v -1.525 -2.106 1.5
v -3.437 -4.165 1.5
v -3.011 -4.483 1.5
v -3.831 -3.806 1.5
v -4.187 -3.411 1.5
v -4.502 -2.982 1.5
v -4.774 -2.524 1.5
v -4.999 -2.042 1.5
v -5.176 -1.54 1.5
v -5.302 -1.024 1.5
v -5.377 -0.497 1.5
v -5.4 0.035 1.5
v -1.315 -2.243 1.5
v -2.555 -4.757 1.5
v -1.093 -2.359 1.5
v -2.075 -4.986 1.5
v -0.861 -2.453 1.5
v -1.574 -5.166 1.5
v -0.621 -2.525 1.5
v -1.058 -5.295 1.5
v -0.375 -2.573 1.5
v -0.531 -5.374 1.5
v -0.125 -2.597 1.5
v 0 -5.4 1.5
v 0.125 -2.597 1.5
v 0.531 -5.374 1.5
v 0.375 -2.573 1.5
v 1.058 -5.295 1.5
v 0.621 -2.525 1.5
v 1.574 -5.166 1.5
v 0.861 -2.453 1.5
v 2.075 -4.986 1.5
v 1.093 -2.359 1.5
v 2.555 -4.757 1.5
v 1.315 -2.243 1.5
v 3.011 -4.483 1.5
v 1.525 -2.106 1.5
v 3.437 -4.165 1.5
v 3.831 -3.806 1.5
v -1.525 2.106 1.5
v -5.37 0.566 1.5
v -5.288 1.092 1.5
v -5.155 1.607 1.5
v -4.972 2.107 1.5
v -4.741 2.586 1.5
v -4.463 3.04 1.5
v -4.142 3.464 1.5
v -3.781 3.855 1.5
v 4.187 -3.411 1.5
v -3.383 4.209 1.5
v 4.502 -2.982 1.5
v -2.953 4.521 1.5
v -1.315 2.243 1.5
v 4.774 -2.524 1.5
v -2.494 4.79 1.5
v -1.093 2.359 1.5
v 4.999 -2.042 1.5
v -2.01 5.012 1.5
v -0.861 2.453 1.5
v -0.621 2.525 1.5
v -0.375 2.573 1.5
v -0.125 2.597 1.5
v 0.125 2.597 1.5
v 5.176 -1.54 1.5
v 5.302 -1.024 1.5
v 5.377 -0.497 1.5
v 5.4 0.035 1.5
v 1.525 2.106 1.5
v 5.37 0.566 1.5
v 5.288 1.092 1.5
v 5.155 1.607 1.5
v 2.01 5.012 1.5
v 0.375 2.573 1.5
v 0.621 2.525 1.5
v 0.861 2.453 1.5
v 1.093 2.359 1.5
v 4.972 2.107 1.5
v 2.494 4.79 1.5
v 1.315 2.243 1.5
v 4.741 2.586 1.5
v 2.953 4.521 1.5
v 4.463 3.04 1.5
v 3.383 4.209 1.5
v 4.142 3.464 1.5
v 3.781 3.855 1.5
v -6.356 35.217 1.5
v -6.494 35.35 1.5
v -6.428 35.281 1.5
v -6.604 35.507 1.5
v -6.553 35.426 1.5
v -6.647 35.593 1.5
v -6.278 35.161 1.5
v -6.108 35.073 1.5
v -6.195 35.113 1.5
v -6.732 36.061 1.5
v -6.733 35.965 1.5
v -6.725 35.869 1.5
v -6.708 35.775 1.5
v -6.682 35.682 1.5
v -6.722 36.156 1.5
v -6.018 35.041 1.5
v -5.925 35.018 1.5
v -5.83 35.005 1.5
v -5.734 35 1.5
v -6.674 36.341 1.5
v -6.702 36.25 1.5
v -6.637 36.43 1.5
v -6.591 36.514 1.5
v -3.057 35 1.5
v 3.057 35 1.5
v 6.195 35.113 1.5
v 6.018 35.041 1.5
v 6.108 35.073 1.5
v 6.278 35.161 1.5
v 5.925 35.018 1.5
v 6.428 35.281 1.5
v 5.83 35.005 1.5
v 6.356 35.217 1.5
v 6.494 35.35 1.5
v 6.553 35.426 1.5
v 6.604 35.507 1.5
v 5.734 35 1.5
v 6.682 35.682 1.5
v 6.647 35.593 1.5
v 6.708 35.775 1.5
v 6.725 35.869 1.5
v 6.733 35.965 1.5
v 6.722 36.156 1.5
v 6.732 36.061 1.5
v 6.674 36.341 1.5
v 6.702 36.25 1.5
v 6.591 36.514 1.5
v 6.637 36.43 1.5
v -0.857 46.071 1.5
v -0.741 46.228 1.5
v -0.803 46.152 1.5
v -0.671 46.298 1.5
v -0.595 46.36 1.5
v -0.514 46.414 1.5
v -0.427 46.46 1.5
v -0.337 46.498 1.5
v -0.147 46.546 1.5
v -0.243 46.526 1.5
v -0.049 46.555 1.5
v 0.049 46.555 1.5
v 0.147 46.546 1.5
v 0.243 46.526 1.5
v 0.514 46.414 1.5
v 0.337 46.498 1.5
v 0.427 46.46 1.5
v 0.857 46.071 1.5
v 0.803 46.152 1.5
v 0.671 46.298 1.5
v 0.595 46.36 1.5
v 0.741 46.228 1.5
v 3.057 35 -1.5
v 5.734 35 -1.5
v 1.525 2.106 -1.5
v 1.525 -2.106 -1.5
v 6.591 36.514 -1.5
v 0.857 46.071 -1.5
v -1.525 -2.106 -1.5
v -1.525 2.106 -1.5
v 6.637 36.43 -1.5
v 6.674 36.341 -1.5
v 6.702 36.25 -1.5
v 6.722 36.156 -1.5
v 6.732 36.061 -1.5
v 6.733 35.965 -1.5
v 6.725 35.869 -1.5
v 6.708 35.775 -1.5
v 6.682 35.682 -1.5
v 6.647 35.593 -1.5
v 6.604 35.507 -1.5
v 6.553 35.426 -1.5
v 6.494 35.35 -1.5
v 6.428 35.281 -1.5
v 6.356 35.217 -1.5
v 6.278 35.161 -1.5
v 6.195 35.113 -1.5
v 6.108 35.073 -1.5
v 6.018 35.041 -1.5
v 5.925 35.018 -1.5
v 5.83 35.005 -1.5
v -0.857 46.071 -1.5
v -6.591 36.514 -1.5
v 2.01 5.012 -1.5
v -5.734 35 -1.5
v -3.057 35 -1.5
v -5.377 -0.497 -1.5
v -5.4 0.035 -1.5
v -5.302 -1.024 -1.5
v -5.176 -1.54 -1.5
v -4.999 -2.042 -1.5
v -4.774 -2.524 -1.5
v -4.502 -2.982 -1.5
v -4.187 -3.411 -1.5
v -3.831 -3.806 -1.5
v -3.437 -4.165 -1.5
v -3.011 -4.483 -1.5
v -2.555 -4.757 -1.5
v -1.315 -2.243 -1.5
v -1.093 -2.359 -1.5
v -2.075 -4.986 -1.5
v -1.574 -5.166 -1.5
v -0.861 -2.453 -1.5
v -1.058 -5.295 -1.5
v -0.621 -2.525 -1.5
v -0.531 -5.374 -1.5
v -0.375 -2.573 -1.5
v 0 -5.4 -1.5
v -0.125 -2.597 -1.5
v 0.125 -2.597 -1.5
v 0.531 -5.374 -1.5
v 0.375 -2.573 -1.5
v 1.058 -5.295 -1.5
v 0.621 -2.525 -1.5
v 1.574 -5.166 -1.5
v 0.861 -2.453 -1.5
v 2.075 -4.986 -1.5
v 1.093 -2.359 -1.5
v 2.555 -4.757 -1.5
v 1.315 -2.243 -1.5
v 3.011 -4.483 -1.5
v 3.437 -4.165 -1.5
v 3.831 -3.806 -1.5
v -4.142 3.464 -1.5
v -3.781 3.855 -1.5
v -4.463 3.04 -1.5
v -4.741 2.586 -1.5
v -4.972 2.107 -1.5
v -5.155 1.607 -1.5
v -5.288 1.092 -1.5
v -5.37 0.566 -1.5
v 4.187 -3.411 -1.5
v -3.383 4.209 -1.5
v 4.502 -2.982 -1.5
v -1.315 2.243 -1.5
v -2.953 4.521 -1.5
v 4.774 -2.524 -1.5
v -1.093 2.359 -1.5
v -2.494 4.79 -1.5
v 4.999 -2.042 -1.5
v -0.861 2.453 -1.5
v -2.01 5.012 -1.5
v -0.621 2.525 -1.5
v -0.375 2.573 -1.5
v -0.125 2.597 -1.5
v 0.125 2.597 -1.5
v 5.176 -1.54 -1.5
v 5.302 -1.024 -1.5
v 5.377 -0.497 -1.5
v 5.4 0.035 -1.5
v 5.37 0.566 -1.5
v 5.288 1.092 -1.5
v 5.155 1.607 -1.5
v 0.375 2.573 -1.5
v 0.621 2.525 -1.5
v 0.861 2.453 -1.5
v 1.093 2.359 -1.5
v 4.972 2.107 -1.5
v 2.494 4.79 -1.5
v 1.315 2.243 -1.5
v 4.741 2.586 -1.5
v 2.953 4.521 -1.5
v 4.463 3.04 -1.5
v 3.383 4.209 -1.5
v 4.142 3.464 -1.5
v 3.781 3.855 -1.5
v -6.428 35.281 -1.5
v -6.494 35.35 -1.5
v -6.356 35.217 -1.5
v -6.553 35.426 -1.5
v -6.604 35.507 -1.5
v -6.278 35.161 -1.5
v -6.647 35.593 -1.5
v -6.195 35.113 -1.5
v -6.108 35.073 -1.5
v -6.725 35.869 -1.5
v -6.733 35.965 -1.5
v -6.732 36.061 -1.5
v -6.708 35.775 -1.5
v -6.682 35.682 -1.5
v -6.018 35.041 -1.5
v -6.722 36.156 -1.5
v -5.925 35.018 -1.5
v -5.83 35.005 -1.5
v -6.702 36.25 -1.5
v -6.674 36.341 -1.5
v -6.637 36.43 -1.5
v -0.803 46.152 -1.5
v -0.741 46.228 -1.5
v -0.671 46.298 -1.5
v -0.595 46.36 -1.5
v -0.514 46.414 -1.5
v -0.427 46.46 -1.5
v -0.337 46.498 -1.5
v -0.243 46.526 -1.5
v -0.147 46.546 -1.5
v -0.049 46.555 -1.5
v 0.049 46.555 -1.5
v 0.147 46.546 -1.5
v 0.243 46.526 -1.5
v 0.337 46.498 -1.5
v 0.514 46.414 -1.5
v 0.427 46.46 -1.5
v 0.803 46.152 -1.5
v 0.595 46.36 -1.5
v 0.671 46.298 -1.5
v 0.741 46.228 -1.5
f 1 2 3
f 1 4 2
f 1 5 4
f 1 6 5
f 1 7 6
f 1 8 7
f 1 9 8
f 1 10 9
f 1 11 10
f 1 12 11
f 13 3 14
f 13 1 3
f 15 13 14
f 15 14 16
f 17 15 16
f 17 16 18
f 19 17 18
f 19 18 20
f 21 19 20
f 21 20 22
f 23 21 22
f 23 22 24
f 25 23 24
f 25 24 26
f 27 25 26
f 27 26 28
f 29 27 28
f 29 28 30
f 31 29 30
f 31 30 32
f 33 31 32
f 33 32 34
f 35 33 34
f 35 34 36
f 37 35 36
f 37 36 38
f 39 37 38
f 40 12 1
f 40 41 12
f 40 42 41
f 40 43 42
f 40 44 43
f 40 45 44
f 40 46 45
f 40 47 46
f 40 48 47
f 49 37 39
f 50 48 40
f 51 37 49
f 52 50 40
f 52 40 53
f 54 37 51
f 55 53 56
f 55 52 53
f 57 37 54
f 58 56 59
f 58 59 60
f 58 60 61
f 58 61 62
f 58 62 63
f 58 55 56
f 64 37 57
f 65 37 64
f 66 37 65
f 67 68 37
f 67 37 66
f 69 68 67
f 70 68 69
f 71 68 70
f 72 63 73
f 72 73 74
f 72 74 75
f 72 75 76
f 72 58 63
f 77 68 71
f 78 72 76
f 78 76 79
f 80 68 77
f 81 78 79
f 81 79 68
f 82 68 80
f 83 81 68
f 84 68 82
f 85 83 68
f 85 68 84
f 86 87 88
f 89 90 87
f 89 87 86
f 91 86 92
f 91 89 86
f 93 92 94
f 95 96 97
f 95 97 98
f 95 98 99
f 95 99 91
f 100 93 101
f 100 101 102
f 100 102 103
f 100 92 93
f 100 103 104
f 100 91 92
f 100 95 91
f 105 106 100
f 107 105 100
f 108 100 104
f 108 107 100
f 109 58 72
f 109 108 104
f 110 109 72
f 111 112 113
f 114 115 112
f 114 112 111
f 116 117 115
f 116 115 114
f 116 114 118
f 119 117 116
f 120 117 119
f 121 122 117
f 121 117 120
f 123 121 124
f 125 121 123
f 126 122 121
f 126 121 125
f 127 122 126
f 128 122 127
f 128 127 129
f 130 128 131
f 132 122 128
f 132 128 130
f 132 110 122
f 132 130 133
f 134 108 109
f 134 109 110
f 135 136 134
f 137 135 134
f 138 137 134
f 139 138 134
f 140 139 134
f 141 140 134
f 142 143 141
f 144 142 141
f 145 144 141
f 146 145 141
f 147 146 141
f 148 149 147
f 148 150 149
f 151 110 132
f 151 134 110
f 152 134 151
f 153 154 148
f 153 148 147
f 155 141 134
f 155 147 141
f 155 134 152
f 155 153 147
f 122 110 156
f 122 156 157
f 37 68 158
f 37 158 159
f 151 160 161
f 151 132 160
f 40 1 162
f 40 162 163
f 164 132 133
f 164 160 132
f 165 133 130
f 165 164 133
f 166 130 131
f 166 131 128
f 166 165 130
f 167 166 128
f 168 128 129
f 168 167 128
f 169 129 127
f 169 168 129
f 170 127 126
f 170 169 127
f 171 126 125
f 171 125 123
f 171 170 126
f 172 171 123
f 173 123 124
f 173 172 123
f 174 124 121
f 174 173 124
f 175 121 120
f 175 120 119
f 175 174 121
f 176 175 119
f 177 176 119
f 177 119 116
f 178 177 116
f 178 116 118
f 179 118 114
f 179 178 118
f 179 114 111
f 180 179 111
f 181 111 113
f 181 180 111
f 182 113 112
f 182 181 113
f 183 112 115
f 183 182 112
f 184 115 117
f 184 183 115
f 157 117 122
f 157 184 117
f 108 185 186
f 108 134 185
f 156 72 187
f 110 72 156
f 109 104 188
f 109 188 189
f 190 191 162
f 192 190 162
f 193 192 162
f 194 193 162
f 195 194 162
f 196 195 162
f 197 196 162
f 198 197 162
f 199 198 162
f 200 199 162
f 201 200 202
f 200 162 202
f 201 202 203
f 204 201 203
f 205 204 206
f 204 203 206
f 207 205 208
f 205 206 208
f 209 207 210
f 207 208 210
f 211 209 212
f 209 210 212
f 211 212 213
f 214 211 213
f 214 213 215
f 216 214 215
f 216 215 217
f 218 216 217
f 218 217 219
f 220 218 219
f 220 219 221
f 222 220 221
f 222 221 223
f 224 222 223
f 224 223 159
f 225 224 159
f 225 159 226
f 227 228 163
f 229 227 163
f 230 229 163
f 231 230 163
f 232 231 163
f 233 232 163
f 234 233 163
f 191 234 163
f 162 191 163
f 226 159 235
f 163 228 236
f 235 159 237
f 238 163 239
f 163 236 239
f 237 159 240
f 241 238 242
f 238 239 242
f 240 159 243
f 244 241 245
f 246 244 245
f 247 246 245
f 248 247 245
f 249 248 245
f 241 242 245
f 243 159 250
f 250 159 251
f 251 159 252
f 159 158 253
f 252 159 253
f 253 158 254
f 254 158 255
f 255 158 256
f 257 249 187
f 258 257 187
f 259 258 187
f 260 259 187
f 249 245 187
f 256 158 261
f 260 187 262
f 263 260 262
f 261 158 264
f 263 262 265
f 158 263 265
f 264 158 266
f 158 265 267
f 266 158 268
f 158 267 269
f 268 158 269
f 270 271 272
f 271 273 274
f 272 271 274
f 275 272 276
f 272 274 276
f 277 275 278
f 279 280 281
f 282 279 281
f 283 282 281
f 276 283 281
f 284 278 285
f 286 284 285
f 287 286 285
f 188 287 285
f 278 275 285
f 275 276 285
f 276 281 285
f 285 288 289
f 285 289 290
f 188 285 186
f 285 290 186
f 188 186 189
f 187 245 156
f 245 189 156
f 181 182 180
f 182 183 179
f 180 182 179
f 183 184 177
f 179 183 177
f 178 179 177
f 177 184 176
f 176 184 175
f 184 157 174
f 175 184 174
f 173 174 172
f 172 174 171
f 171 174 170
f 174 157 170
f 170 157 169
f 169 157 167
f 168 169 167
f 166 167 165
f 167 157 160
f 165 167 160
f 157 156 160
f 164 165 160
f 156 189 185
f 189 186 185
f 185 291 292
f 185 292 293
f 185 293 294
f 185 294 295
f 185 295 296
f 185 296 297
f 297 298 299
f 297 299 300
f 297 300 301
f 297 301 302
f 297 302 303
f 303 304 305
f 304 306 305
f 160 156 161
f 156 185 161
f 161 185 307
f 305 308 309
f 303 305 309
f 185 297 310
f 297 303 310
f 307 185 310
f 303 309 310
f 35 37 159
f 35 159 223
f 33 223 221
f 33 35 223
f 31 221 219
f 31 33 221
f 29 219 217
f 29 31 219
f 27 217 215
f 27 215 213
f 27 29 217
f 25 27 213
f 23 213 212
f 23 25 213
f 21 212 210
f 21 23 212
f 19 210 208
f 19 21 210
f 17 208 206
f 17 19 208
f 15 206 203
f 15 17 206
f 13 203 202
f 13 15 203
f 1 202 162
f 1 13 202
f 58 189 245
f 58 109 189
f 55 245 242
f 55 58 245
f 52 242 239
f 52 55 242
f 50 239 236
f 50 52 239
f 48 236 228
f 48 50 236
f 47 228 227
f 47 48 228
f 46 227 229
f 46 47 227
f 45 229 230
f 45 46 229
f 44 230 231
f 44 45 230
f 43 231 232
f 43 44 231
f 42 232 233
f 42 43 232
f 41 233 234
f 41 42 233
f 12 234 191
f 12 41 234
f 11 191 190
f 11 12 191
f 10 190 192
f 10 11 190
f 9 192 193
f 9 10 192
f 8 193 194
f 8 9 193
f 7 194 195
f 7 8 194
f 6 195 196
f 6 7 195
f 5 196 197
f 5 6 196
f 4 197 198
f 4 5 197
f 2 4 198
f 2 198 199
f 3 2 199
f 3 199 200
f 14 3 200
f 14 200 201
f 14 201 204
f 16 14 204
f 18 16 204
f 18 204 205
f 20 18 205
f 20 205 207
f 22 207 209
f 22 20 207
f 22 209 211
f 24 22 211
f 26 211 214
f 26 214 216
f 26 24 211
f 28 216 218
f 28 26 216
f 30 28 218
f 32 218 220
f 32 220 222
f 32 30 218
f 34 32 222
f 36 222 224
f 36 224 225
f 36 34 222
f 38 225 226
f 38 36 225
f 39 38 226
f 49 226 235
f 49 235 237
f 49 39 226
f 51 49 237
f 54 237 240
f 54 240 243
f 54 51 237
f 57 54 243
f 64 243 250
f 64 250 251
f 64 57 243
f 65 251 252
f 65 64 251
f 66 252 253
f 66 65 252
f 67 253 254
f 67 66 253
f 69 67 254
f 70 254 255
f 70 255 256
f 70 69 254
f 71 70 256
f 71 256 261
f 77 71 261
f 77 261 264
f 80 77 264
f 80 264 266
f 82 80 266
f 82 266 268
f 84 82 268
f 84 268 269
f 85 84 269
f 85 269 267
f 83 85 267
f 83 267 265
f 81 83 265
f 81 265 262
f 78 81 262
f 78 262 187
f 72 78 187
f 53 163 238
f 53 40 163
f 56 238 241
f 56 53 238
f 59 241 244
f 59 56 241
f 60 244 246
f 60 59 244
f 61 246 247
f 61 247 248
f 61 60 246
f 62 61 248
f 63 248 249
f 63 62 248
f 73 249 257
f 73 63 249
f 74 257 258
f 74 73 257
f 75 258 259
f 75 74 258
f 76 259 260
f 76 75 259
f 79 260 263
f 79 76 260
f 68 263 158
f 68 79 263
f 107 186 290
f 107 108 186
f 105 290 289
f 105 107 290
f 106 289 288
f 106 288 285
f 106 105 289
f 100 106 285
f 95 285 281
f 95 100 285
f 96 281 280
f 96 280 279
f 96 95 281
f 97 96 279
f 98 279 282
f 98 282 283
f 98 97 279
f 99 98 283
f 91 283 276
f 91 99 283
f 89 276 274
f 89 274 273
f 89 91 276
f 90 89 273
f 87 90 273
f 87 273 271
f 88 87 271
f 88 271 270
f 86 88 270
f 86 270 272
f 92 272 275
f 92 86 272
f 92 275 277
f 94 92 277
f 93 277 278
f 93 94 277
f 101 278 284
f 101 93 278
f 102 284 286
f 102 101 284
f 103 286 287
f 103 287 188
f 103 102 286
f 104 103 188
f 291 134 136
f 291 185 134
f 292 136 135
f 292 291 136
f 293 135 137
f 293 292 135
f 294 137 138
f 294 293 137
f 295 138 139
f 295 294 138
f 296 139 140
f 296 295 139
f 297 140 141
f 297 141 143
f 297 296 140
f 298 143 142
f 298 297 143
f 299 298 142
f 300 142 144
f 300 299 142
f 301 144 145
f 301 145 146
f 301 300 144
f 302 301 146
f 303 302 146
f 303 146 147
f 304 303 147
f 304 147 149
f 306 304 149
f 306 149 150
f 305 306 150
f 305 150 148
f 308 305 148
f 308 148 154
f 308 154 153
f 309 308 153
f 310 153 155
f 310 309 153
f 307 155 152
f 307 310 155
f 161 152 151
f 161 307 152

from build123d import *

# Parameters (mm, degrees)
F0_R     = 5.4
F1_DEPTH = 1.5
F3_DEPTH = 1.5
F4_DEPTH = 1.5
F6_DEPTH = 1.5
F7_DEPTH = 1.5
F8_R     = 1


with BuildPart() as f1:
    # F0 (on Top) → F1 (new body, symmetric)
    with BuildSketch(Plane.XY):
        Circle(F0_R)
        with BuildLine():
            ThreePointArc((1.525, 2.1057955741), (2.3157072354, 1.1821590418), (2.6, 0))
            ThreePointArc((2.6, 0), (2.3157072354, -1.1821590418), (1.525, -2.1057955741))
            ThreePointArc((1.525, -2.1057955741), (0, -2.6), (-1.525, -2.1057955741))
            ThreePointArc((-1.525, -2.1057955741), (-2.6, 0), (-1.525, 2.1057955741))
            ThreePointArc((-1.525, 2.1057955741), (0, 2.6), (1.525, 2.1057955741))
        make_face(mode=Mode.SUBTRACT)
        with BuildLine():
            ThreePointArc((1.525, -2.1057955741), (2.3157072354, -1.1821590418), (2.6, 0))
            ThreePointArc((2.6, 0), (2.3157072354, 1.1821590418), (1.525, 2.1057955741))
            Line((1.525, 2.1057955741), (1.525, -2.1057955741))
        make_face()
        with BuildLine():
            Line((-1.525, -2.1057955741), (-1.525, 2.1057955741))
            ThreePointArc((-1.525, 2.1057955741), (-2.6, 0), (-1.525, -2.1057955741))
        make_face()
    extrude(amount=F1_DEPTH, both=True)

    # F2 (on Top) → F3 (join, through all)
    with BuildSketch(Plane.XY):
        Polygon((-2, 4.724830389), (0, 4.724830389), (2, 4.724830389), (3.0572322193, 35), (0, 35), (-3.0572322193, 35), align=None)
    extrude(amount=F3_DEPTH)

    # F4 (add, through all): a face of the model
    f4_faces = [f1.faces().sort_by_distance(p)[0] for p in [
        (0, 21.149058398, 0),
    ]]
    extrude(f4_faces, amount=F4_DEPTH)

    # F5 (on Top) → F6 (join, through all)
    with BuildSketch(Plane.XY):
        Polygon((0, 47.5), (-7.5, 35), (7.5, 35), align=None)
    extrude(amount=F6_DEPTH)

    # F7 (add, through all): a face of the model
    f7_faces = [f1.faces().sort_by_distance(p)[0] for p in [
        (0, 39.1666666667, 0),
    ]]
    extrude(f7_faces, amount=F7_DEPTH)

    # F8
    f8_edges = [f1.edges().sort_by_distance(p)[0] for p in [
        (0, 47.5, 0),
        (-7.5, 35, 0),
        (7.5, 35, 0),
    ]]
    fillet(f8_edges, radius=F8_R)


solid = f1.part
